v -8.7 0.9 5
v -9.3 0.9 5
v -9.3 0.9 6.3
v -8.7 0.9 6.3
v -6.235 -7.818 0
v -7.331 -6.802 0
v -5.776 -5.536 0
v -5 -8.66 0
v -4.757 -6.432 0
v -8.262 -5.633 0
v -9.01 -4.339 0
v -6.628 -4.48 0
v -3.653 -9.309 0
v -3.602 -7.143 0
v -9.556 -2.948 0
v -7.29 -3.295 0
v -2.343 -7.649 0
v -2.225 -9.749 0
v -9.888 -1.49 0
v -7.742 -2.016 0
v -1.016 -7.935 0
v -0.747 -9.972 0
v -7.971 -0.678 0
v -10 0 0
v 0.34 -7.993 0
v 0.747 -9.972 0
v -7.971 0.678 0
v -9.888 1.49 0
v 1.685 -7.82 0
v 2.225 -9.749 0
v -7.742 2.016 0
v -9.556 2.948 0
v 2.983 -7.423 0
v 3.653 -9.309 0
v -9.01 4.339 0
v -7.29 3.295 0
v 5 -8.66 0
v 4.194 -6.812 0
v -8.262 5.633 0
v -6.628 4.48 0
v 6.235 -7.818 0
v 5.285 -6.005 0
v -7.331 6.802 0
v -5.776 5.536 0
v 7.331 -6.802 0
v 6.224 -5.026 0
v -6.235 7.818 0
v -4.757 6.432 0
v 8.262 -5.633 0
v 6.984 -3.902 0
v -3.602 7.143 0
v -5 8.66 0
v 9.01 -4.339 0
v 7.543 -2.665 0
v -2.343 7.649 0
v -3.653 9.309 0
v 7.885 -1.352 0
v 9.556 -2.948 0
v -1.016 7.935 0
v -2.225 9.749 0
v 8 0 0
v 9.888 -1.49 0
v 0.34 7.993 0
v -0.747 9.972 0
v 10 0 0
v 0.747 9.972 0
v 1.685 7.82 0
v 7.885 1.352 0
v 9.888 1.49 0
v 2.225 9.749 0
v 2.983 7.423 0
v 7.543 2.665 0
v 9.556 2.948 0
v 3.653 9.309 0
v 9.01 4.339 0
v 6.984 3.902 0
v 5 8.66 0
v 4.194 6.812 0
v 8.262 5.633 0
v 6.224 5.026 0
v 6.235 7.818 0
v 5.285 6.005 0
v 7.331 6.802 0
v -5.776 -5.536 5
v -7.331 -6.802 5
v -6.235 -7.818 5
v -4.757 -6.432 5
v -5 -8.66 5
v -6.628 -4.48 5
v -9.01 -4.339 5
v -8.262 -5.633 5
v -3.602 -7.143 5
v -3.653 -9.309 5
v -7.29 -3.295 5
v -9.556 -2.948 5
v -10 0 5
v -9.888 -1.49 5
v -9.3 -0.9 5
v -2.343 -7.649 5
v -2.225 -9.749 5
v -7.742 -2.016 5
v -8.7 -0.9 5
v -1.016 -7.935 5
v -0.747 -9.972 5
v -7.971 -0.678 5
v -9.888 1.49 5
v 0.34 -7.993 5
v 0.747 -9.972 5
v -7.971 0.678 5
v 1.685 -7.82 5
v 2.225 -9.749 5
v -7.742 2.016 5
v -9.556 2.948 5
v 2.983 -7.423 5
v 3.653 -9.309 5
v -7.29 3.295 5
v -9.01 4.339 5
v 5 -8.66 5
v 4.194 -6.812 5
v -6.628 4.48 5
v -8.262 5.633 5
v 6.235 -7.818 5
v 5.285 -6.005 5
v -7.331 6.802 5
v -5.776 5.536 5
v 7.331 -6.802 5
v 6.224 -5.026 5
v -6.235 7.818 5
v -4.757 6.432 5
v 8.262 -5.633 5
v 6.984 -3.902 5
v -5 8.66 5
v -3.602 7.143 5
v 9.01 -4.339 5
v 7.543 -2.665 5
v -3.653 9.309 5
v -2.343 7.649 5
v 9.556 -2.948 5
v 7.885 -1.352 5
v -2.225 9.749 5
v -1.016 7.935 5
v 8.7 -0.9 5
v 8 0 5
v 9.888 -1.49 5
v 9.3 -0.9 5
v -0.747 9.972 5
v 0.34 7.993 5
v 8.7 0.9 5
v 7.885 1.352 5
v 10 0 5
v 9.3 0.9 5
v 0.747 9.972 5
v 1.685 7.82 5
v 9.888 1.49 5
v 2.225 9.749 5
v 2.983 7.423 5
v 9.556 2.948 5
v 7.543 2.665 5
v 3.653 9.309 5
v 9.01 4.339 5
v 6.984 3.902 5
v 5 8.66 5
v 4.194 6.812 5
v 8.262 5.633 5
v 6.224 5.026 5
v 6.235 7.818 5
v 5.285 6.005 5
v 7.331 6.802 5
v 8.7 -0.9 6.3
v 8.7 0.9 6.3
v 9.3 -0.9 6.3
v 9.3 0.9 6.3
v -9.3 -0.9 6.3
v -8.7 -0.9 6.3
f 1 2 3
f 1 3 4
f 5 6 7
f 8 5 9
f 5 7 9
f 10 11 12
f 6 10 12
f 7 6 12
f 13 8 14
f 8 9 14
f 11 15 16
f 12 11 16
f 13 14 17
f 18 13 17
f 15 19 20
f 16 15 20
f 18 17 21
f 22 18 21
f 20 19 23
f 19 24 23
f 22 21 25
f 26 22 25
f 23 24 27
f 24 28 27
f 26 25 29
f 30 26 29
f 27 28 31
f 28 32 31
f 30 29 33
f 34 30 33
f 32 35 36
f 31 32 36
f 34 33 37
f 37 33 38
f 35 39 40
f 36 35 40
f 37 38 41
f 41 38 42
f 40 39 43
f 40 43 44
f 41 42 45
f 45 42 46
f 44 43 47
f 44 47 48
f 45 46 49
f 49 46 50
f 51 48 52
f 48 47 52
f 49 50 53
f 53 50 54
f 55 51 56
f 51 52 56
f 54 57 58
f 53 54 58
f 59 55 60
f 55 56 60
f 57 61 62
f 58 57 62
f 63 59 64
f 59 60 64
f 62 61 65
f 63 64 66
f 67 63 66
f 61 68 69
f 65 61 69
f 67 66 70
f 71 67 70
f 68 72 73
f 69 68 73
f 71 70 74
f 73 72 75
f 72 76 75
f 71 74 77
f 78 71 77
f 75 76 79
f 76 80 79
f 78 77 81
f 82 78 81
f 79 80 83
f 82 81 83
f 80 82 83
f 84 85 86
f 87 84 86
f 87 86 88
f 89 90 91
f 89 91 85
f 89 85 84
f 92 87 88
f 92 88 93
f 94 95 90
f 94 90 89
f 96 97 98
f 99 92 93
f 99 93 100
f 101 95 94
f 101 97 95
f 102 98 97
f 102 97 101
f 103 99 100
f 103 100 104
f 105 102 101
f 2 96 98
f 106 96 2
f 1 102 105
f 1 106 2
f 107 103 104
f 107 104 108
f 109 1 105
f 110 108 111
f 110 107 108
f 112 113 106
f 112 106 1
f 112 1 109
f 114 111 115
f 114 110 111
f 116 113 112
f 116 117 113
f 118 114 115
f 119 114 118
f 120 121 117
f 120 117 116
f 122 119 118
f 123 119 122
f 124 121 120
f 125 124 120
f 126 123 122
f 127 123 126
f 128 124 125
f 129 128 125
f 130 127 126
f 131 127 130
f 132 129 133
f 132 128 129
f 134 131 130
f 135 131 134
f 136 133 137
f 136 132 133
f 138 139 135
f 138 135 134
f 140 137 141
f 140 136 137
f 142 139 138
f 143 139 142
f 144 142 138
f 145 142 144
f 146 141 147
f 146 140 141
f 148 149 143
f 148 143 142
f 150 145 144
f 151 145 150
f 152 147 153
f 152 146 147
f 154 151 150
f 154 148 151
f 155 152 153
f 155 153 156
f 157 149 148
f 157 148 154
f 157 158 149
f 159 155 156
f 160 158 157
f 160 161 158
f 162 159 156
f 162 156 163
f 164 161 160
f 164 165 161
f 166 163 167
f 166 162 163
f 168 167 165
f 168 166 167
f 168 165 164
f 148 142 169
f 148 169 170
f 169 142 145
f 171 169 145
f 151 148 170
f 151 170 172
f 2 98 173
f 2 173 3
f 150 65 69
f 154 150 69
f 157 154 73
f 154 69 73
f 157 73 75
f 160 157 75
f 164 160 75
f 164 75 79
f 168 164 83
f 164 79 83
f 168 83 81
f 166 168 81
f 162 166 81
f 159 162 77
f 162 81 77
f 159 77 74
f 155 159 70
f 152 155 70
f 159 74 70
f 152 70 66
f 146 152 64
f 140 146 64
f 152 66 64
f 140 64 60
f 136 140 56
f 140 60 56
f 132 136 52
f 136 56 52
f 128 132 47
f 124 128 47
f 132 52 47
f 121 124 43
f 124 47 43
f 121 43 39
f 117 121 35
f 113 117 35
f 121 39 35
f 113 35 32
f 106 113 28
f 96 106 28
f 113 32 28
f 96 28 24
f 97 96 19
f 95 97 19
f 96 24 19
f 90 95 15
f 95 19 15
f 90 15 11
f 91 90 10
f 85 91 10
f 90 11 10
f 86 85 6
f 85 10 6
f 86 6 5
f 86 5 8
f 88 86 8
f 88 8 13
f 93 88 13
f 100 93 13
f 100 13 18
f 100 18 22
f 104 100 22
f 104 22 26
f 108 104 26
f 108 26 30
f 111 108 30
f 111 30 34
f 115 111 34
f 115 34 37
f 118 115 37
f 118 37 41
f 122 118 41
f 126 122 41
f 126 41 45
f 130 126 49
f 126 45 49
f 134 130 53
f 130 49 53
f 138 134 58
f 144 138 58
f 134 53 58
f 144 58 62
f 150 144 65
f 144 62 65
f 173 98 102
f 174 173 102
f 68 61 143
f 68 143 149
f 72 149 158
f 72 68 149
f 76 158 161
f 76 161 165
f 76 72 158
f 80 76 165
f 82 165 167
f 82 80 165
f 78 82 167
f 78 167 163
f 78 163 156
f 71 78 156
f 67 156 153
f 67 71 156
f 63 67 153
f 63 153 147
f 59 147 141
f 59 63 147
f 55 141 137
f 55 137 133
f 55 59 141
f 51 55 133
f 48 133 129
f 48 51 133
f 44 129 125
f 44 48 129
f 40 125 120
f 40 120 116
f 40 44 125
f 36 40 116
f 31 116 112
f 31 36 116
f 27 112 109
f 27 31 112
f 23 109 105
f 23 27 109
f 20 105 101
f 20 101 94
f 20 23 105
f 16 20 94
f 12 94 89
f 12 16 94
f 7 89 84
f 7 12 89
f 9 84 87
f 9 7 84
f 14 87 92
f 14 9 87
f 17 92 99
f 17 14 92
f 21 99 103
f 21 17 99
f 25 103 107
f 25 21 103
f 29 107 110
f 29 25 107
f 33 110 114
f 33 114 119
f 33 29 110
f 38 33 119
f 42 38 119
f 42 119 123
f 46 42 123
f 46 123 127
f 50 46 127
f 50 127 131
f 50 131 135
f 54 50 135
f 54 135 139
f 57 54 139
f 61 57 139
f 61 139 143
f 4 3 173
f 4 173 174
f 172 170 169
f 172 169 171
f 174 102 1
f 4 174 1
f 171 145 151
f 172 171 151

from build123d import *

# Parameters (mm, degrees)
F0_W     = 0.6
F0_H     = 1.8
F1_DEPTH = 6.3
F0_R     = 10
F0_R_2   = 8
F2_DEPTH = 5


with BuildPart() as f1:
    # F0 (on Top) → F1 (new body)
    with BuildSketch(Plane.XY):
        with Locations((-9, 0)):
            Rectangle(F0_W, F0_H)
    extrude(amount=F1_DEPTH)



with BuildPart() as f1b:
    # F0 (on Top) → F1, piece 2 (new body)
    with BuildSketch(Plane.XY):
        with Locations((9, 0)):
            Rectangle(F0_W, F0_H)
    extrude(amount=F1_DEPTH)


with BuildPart() as f1_1:
    add(f1.part)

    add(f1b.part)  # F2 merges F1b
    # F0 (on Top) → F2 (join)
    with BuildSketch(Plane.XY):
        Circle(F0_R)
        with Locations((-9, 0)):
            Rectangle(F0_W, F0_H, mode=Mode.SUBTRACT)
        Circle(F0_R_2, mode=Mode.SUBTRACT)
        with Locations((9, 0)):
            Rectangle(F0_W, F0_H, mode=Mode.SUBTRACT)
    extrude(amount=F2_DEPTH)


solid = f1_1.part
